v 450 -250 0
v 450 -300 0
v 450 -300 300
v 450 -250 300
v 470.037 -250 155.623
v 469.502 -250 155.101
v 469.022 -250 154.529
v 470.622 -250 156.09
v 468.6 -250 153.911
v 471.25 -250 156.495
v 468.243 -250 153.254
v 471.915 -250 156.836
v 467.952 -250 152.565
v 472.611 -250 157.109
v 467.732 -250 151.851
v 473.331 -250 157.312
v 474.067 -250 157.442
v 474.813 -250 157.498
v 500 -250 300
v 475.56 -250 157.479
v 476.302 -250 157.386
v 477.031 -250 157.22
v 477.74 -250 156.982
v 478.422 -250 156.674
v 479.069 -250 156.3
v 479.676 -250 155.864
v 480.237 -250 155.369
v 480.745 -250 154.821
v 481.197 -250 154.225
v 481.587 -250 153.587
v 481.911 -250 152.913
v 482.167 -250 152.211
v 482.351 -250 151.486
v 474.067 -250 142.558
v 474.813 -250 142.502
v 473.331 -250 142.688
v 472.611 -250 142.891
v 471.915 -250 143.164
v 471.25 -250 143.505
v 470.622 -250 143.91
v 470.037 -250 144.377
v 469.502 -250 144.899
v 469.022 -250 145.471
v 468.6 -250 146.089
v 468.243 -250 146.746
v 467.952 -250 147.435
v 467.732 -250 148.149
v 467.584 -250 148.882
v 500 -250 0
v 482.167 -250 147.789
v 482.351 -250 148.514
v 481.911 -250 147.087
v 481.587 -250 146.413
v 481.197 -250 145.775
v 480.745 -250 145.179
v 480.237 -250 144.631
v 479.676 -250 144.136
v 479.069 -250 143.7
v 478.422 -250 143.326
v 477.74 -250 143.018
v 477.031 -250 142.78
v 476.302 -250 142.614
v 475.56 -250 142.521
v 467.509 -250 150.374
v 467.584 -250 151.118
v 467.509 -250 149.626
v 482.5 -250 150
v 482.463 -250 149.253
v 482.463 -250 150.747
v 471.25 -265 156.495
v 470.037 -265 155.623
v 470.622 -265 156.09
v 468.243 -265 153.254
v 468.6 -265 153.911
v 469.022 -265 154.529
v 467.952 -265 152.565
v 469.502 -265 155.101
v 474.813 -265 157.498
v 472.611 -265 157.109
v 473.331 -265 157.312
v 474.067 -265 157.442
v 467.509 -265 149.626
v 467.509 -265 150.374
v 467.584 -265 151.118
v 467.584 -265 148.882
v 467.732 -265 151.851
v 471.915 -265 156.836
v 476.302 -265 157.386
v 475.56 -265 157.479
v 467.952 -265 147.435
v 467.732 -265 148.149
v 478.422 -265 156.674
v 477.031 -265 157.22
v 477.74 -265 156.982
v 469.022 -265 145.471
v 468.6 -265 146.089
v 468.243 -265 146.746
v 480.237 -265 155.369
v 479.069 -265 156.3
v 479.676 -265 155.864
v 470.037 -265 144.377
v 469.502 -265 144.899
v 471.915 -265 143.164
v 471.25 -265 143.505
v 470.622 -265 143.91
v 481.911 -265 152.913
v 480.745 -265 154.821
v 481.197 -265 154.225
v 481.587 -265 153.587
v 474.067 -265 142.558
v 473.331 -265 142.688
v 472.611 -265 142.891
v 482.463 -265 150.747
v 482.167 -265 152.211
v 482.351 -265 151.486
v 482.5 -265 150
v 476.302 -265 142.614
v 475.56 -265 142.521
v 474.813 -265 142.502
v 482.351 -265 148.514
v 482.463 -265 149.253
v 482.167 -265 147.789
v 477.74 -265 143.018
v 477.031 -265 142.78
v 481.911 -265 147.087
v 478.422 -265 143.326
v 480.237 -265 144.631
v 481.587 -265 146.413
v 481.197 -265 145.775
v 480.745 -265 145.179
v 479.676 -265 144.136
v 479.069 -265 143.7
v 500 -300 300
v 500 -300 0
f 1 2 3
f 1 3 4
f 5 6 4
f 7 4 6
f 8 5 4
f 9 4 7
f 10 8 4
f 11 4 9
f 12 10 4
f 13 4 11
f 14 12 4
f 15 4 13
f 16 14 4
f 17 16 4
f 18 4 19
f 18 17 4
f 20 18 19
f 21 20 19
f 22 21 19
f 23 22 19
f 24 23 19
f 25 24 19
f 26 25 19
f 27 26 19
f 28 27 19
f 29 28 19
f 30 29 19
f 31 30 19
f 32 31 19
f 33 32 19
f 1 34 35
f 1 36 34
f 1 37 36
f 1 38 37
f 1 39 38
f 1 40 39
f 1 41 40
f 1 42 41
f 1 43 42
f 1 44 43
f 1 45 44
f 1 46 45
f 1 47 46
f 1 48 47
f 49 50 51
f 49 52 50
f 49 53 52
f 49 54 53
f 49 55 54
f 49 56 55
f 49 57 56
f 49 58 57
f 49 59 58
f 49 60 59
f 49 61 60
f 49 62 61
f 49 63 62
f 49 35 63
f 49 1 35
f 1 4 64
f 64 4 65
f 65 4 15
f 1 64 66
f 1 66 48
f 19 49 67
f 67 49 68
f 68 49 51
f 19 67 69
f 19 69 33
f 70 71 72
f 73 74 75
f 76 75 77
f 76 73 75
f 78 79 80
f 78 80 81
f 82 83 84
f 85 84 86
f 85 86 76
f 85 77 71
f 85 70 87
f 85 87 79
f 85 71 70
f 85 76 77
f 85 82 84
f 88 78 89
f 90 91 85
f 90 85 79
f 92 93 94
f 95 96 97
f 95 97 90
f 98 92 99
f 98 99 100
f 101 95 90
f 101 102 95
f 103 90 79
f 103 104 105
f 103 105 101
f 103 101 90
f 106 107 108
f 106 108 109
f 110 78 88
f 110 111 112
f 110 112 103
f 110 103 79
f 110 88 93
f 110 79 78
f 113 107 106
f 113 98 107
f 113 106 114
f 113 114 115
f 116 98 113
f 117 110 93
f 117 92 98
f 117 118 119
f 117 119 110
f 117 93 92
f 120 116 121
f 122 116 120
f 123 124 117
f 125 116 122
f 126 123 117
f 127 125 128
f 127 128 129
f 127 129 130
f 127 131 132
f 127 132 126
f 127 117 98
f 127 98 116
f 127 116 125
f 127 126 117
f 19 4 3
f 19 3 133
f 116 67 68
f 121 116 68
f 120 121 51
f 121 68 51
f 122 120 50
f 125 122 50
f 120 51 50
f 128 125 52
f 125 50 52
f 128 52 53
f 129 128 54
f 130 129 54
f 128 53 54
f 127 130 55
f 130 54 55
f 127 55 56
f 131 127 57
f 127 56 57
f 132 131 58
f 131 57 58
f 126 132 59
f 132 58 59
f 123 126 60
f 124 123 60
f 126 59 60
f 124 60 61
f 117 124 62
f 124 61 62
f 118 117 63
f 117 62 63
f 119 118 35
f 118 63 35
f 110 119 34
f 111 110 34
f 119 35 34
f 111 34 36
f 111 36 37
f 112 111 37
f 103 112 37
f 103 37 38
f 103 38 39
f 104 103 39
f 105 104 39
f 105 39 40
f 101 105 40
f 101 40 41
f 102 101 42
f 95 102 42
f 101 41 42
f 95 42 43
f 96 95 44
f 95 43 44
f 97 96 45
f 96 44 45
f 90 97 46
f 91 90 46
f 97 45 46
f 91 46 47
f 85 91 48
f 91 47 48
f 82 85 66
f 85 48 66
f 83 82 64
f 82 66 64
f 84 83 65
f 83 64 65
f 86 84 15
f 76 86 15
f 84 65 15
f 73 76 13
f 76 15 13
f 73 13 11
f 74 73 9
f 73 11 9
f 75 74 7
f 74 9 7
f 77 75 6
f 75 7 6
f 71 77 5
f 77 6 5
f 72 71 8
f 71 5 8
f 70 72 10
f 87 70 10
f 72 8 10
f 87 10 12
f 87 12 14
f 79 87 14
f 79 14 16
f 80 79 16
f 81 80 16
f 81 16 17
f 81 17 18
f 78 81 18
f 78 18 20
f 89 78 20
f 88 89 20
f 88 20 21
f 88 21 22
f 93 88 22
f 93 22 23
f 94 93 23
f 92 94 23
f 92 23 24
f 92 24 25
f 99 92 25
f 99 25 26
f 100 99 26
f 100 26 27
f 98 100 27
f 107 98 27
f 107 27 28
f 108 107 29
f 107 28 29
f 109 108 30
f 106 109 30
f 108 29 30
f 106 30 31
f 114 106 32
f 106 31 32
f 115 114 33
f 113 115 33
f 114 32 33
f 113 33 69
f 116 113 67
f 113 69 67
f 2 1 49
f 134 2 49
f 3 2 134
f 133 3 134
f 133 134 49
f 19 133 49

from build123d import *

# Parameters (mm, degrees)
SKETCH1_W           = 50
SKETCH1_H           = 50
BOSS_EXTRUDE1_DEPTH = 300
SKETCH2_R           = 7.5
CUT_EXTRUDE1_DEPTH  = 15


with BuildPart() as part:
    # Sketch1 → Boss-Extrude1 (new body)
    with BuildSketch(Plane.XY):
        with Locations((475, -275)):
            Rectangle(SKETCH1_W, SKETCH1_H)
    extrude(amount=BOSS_EXTRUDE1_DEPTH)

    # Sketch2 → Cut-Extrude1 (cut)
    with BuildSketch(Plane(origin=(0, -250, 0), x_dir=(1, 0, 0), z_dir=(0, 1, 0))):
        with Locations((475, -150)):
            Circle(SKETCH2_R)
    extrude(amount=-CUT_EXTRUDE1_DEPTH, mode=Mode.SUBTRACT)


solid = part.part
